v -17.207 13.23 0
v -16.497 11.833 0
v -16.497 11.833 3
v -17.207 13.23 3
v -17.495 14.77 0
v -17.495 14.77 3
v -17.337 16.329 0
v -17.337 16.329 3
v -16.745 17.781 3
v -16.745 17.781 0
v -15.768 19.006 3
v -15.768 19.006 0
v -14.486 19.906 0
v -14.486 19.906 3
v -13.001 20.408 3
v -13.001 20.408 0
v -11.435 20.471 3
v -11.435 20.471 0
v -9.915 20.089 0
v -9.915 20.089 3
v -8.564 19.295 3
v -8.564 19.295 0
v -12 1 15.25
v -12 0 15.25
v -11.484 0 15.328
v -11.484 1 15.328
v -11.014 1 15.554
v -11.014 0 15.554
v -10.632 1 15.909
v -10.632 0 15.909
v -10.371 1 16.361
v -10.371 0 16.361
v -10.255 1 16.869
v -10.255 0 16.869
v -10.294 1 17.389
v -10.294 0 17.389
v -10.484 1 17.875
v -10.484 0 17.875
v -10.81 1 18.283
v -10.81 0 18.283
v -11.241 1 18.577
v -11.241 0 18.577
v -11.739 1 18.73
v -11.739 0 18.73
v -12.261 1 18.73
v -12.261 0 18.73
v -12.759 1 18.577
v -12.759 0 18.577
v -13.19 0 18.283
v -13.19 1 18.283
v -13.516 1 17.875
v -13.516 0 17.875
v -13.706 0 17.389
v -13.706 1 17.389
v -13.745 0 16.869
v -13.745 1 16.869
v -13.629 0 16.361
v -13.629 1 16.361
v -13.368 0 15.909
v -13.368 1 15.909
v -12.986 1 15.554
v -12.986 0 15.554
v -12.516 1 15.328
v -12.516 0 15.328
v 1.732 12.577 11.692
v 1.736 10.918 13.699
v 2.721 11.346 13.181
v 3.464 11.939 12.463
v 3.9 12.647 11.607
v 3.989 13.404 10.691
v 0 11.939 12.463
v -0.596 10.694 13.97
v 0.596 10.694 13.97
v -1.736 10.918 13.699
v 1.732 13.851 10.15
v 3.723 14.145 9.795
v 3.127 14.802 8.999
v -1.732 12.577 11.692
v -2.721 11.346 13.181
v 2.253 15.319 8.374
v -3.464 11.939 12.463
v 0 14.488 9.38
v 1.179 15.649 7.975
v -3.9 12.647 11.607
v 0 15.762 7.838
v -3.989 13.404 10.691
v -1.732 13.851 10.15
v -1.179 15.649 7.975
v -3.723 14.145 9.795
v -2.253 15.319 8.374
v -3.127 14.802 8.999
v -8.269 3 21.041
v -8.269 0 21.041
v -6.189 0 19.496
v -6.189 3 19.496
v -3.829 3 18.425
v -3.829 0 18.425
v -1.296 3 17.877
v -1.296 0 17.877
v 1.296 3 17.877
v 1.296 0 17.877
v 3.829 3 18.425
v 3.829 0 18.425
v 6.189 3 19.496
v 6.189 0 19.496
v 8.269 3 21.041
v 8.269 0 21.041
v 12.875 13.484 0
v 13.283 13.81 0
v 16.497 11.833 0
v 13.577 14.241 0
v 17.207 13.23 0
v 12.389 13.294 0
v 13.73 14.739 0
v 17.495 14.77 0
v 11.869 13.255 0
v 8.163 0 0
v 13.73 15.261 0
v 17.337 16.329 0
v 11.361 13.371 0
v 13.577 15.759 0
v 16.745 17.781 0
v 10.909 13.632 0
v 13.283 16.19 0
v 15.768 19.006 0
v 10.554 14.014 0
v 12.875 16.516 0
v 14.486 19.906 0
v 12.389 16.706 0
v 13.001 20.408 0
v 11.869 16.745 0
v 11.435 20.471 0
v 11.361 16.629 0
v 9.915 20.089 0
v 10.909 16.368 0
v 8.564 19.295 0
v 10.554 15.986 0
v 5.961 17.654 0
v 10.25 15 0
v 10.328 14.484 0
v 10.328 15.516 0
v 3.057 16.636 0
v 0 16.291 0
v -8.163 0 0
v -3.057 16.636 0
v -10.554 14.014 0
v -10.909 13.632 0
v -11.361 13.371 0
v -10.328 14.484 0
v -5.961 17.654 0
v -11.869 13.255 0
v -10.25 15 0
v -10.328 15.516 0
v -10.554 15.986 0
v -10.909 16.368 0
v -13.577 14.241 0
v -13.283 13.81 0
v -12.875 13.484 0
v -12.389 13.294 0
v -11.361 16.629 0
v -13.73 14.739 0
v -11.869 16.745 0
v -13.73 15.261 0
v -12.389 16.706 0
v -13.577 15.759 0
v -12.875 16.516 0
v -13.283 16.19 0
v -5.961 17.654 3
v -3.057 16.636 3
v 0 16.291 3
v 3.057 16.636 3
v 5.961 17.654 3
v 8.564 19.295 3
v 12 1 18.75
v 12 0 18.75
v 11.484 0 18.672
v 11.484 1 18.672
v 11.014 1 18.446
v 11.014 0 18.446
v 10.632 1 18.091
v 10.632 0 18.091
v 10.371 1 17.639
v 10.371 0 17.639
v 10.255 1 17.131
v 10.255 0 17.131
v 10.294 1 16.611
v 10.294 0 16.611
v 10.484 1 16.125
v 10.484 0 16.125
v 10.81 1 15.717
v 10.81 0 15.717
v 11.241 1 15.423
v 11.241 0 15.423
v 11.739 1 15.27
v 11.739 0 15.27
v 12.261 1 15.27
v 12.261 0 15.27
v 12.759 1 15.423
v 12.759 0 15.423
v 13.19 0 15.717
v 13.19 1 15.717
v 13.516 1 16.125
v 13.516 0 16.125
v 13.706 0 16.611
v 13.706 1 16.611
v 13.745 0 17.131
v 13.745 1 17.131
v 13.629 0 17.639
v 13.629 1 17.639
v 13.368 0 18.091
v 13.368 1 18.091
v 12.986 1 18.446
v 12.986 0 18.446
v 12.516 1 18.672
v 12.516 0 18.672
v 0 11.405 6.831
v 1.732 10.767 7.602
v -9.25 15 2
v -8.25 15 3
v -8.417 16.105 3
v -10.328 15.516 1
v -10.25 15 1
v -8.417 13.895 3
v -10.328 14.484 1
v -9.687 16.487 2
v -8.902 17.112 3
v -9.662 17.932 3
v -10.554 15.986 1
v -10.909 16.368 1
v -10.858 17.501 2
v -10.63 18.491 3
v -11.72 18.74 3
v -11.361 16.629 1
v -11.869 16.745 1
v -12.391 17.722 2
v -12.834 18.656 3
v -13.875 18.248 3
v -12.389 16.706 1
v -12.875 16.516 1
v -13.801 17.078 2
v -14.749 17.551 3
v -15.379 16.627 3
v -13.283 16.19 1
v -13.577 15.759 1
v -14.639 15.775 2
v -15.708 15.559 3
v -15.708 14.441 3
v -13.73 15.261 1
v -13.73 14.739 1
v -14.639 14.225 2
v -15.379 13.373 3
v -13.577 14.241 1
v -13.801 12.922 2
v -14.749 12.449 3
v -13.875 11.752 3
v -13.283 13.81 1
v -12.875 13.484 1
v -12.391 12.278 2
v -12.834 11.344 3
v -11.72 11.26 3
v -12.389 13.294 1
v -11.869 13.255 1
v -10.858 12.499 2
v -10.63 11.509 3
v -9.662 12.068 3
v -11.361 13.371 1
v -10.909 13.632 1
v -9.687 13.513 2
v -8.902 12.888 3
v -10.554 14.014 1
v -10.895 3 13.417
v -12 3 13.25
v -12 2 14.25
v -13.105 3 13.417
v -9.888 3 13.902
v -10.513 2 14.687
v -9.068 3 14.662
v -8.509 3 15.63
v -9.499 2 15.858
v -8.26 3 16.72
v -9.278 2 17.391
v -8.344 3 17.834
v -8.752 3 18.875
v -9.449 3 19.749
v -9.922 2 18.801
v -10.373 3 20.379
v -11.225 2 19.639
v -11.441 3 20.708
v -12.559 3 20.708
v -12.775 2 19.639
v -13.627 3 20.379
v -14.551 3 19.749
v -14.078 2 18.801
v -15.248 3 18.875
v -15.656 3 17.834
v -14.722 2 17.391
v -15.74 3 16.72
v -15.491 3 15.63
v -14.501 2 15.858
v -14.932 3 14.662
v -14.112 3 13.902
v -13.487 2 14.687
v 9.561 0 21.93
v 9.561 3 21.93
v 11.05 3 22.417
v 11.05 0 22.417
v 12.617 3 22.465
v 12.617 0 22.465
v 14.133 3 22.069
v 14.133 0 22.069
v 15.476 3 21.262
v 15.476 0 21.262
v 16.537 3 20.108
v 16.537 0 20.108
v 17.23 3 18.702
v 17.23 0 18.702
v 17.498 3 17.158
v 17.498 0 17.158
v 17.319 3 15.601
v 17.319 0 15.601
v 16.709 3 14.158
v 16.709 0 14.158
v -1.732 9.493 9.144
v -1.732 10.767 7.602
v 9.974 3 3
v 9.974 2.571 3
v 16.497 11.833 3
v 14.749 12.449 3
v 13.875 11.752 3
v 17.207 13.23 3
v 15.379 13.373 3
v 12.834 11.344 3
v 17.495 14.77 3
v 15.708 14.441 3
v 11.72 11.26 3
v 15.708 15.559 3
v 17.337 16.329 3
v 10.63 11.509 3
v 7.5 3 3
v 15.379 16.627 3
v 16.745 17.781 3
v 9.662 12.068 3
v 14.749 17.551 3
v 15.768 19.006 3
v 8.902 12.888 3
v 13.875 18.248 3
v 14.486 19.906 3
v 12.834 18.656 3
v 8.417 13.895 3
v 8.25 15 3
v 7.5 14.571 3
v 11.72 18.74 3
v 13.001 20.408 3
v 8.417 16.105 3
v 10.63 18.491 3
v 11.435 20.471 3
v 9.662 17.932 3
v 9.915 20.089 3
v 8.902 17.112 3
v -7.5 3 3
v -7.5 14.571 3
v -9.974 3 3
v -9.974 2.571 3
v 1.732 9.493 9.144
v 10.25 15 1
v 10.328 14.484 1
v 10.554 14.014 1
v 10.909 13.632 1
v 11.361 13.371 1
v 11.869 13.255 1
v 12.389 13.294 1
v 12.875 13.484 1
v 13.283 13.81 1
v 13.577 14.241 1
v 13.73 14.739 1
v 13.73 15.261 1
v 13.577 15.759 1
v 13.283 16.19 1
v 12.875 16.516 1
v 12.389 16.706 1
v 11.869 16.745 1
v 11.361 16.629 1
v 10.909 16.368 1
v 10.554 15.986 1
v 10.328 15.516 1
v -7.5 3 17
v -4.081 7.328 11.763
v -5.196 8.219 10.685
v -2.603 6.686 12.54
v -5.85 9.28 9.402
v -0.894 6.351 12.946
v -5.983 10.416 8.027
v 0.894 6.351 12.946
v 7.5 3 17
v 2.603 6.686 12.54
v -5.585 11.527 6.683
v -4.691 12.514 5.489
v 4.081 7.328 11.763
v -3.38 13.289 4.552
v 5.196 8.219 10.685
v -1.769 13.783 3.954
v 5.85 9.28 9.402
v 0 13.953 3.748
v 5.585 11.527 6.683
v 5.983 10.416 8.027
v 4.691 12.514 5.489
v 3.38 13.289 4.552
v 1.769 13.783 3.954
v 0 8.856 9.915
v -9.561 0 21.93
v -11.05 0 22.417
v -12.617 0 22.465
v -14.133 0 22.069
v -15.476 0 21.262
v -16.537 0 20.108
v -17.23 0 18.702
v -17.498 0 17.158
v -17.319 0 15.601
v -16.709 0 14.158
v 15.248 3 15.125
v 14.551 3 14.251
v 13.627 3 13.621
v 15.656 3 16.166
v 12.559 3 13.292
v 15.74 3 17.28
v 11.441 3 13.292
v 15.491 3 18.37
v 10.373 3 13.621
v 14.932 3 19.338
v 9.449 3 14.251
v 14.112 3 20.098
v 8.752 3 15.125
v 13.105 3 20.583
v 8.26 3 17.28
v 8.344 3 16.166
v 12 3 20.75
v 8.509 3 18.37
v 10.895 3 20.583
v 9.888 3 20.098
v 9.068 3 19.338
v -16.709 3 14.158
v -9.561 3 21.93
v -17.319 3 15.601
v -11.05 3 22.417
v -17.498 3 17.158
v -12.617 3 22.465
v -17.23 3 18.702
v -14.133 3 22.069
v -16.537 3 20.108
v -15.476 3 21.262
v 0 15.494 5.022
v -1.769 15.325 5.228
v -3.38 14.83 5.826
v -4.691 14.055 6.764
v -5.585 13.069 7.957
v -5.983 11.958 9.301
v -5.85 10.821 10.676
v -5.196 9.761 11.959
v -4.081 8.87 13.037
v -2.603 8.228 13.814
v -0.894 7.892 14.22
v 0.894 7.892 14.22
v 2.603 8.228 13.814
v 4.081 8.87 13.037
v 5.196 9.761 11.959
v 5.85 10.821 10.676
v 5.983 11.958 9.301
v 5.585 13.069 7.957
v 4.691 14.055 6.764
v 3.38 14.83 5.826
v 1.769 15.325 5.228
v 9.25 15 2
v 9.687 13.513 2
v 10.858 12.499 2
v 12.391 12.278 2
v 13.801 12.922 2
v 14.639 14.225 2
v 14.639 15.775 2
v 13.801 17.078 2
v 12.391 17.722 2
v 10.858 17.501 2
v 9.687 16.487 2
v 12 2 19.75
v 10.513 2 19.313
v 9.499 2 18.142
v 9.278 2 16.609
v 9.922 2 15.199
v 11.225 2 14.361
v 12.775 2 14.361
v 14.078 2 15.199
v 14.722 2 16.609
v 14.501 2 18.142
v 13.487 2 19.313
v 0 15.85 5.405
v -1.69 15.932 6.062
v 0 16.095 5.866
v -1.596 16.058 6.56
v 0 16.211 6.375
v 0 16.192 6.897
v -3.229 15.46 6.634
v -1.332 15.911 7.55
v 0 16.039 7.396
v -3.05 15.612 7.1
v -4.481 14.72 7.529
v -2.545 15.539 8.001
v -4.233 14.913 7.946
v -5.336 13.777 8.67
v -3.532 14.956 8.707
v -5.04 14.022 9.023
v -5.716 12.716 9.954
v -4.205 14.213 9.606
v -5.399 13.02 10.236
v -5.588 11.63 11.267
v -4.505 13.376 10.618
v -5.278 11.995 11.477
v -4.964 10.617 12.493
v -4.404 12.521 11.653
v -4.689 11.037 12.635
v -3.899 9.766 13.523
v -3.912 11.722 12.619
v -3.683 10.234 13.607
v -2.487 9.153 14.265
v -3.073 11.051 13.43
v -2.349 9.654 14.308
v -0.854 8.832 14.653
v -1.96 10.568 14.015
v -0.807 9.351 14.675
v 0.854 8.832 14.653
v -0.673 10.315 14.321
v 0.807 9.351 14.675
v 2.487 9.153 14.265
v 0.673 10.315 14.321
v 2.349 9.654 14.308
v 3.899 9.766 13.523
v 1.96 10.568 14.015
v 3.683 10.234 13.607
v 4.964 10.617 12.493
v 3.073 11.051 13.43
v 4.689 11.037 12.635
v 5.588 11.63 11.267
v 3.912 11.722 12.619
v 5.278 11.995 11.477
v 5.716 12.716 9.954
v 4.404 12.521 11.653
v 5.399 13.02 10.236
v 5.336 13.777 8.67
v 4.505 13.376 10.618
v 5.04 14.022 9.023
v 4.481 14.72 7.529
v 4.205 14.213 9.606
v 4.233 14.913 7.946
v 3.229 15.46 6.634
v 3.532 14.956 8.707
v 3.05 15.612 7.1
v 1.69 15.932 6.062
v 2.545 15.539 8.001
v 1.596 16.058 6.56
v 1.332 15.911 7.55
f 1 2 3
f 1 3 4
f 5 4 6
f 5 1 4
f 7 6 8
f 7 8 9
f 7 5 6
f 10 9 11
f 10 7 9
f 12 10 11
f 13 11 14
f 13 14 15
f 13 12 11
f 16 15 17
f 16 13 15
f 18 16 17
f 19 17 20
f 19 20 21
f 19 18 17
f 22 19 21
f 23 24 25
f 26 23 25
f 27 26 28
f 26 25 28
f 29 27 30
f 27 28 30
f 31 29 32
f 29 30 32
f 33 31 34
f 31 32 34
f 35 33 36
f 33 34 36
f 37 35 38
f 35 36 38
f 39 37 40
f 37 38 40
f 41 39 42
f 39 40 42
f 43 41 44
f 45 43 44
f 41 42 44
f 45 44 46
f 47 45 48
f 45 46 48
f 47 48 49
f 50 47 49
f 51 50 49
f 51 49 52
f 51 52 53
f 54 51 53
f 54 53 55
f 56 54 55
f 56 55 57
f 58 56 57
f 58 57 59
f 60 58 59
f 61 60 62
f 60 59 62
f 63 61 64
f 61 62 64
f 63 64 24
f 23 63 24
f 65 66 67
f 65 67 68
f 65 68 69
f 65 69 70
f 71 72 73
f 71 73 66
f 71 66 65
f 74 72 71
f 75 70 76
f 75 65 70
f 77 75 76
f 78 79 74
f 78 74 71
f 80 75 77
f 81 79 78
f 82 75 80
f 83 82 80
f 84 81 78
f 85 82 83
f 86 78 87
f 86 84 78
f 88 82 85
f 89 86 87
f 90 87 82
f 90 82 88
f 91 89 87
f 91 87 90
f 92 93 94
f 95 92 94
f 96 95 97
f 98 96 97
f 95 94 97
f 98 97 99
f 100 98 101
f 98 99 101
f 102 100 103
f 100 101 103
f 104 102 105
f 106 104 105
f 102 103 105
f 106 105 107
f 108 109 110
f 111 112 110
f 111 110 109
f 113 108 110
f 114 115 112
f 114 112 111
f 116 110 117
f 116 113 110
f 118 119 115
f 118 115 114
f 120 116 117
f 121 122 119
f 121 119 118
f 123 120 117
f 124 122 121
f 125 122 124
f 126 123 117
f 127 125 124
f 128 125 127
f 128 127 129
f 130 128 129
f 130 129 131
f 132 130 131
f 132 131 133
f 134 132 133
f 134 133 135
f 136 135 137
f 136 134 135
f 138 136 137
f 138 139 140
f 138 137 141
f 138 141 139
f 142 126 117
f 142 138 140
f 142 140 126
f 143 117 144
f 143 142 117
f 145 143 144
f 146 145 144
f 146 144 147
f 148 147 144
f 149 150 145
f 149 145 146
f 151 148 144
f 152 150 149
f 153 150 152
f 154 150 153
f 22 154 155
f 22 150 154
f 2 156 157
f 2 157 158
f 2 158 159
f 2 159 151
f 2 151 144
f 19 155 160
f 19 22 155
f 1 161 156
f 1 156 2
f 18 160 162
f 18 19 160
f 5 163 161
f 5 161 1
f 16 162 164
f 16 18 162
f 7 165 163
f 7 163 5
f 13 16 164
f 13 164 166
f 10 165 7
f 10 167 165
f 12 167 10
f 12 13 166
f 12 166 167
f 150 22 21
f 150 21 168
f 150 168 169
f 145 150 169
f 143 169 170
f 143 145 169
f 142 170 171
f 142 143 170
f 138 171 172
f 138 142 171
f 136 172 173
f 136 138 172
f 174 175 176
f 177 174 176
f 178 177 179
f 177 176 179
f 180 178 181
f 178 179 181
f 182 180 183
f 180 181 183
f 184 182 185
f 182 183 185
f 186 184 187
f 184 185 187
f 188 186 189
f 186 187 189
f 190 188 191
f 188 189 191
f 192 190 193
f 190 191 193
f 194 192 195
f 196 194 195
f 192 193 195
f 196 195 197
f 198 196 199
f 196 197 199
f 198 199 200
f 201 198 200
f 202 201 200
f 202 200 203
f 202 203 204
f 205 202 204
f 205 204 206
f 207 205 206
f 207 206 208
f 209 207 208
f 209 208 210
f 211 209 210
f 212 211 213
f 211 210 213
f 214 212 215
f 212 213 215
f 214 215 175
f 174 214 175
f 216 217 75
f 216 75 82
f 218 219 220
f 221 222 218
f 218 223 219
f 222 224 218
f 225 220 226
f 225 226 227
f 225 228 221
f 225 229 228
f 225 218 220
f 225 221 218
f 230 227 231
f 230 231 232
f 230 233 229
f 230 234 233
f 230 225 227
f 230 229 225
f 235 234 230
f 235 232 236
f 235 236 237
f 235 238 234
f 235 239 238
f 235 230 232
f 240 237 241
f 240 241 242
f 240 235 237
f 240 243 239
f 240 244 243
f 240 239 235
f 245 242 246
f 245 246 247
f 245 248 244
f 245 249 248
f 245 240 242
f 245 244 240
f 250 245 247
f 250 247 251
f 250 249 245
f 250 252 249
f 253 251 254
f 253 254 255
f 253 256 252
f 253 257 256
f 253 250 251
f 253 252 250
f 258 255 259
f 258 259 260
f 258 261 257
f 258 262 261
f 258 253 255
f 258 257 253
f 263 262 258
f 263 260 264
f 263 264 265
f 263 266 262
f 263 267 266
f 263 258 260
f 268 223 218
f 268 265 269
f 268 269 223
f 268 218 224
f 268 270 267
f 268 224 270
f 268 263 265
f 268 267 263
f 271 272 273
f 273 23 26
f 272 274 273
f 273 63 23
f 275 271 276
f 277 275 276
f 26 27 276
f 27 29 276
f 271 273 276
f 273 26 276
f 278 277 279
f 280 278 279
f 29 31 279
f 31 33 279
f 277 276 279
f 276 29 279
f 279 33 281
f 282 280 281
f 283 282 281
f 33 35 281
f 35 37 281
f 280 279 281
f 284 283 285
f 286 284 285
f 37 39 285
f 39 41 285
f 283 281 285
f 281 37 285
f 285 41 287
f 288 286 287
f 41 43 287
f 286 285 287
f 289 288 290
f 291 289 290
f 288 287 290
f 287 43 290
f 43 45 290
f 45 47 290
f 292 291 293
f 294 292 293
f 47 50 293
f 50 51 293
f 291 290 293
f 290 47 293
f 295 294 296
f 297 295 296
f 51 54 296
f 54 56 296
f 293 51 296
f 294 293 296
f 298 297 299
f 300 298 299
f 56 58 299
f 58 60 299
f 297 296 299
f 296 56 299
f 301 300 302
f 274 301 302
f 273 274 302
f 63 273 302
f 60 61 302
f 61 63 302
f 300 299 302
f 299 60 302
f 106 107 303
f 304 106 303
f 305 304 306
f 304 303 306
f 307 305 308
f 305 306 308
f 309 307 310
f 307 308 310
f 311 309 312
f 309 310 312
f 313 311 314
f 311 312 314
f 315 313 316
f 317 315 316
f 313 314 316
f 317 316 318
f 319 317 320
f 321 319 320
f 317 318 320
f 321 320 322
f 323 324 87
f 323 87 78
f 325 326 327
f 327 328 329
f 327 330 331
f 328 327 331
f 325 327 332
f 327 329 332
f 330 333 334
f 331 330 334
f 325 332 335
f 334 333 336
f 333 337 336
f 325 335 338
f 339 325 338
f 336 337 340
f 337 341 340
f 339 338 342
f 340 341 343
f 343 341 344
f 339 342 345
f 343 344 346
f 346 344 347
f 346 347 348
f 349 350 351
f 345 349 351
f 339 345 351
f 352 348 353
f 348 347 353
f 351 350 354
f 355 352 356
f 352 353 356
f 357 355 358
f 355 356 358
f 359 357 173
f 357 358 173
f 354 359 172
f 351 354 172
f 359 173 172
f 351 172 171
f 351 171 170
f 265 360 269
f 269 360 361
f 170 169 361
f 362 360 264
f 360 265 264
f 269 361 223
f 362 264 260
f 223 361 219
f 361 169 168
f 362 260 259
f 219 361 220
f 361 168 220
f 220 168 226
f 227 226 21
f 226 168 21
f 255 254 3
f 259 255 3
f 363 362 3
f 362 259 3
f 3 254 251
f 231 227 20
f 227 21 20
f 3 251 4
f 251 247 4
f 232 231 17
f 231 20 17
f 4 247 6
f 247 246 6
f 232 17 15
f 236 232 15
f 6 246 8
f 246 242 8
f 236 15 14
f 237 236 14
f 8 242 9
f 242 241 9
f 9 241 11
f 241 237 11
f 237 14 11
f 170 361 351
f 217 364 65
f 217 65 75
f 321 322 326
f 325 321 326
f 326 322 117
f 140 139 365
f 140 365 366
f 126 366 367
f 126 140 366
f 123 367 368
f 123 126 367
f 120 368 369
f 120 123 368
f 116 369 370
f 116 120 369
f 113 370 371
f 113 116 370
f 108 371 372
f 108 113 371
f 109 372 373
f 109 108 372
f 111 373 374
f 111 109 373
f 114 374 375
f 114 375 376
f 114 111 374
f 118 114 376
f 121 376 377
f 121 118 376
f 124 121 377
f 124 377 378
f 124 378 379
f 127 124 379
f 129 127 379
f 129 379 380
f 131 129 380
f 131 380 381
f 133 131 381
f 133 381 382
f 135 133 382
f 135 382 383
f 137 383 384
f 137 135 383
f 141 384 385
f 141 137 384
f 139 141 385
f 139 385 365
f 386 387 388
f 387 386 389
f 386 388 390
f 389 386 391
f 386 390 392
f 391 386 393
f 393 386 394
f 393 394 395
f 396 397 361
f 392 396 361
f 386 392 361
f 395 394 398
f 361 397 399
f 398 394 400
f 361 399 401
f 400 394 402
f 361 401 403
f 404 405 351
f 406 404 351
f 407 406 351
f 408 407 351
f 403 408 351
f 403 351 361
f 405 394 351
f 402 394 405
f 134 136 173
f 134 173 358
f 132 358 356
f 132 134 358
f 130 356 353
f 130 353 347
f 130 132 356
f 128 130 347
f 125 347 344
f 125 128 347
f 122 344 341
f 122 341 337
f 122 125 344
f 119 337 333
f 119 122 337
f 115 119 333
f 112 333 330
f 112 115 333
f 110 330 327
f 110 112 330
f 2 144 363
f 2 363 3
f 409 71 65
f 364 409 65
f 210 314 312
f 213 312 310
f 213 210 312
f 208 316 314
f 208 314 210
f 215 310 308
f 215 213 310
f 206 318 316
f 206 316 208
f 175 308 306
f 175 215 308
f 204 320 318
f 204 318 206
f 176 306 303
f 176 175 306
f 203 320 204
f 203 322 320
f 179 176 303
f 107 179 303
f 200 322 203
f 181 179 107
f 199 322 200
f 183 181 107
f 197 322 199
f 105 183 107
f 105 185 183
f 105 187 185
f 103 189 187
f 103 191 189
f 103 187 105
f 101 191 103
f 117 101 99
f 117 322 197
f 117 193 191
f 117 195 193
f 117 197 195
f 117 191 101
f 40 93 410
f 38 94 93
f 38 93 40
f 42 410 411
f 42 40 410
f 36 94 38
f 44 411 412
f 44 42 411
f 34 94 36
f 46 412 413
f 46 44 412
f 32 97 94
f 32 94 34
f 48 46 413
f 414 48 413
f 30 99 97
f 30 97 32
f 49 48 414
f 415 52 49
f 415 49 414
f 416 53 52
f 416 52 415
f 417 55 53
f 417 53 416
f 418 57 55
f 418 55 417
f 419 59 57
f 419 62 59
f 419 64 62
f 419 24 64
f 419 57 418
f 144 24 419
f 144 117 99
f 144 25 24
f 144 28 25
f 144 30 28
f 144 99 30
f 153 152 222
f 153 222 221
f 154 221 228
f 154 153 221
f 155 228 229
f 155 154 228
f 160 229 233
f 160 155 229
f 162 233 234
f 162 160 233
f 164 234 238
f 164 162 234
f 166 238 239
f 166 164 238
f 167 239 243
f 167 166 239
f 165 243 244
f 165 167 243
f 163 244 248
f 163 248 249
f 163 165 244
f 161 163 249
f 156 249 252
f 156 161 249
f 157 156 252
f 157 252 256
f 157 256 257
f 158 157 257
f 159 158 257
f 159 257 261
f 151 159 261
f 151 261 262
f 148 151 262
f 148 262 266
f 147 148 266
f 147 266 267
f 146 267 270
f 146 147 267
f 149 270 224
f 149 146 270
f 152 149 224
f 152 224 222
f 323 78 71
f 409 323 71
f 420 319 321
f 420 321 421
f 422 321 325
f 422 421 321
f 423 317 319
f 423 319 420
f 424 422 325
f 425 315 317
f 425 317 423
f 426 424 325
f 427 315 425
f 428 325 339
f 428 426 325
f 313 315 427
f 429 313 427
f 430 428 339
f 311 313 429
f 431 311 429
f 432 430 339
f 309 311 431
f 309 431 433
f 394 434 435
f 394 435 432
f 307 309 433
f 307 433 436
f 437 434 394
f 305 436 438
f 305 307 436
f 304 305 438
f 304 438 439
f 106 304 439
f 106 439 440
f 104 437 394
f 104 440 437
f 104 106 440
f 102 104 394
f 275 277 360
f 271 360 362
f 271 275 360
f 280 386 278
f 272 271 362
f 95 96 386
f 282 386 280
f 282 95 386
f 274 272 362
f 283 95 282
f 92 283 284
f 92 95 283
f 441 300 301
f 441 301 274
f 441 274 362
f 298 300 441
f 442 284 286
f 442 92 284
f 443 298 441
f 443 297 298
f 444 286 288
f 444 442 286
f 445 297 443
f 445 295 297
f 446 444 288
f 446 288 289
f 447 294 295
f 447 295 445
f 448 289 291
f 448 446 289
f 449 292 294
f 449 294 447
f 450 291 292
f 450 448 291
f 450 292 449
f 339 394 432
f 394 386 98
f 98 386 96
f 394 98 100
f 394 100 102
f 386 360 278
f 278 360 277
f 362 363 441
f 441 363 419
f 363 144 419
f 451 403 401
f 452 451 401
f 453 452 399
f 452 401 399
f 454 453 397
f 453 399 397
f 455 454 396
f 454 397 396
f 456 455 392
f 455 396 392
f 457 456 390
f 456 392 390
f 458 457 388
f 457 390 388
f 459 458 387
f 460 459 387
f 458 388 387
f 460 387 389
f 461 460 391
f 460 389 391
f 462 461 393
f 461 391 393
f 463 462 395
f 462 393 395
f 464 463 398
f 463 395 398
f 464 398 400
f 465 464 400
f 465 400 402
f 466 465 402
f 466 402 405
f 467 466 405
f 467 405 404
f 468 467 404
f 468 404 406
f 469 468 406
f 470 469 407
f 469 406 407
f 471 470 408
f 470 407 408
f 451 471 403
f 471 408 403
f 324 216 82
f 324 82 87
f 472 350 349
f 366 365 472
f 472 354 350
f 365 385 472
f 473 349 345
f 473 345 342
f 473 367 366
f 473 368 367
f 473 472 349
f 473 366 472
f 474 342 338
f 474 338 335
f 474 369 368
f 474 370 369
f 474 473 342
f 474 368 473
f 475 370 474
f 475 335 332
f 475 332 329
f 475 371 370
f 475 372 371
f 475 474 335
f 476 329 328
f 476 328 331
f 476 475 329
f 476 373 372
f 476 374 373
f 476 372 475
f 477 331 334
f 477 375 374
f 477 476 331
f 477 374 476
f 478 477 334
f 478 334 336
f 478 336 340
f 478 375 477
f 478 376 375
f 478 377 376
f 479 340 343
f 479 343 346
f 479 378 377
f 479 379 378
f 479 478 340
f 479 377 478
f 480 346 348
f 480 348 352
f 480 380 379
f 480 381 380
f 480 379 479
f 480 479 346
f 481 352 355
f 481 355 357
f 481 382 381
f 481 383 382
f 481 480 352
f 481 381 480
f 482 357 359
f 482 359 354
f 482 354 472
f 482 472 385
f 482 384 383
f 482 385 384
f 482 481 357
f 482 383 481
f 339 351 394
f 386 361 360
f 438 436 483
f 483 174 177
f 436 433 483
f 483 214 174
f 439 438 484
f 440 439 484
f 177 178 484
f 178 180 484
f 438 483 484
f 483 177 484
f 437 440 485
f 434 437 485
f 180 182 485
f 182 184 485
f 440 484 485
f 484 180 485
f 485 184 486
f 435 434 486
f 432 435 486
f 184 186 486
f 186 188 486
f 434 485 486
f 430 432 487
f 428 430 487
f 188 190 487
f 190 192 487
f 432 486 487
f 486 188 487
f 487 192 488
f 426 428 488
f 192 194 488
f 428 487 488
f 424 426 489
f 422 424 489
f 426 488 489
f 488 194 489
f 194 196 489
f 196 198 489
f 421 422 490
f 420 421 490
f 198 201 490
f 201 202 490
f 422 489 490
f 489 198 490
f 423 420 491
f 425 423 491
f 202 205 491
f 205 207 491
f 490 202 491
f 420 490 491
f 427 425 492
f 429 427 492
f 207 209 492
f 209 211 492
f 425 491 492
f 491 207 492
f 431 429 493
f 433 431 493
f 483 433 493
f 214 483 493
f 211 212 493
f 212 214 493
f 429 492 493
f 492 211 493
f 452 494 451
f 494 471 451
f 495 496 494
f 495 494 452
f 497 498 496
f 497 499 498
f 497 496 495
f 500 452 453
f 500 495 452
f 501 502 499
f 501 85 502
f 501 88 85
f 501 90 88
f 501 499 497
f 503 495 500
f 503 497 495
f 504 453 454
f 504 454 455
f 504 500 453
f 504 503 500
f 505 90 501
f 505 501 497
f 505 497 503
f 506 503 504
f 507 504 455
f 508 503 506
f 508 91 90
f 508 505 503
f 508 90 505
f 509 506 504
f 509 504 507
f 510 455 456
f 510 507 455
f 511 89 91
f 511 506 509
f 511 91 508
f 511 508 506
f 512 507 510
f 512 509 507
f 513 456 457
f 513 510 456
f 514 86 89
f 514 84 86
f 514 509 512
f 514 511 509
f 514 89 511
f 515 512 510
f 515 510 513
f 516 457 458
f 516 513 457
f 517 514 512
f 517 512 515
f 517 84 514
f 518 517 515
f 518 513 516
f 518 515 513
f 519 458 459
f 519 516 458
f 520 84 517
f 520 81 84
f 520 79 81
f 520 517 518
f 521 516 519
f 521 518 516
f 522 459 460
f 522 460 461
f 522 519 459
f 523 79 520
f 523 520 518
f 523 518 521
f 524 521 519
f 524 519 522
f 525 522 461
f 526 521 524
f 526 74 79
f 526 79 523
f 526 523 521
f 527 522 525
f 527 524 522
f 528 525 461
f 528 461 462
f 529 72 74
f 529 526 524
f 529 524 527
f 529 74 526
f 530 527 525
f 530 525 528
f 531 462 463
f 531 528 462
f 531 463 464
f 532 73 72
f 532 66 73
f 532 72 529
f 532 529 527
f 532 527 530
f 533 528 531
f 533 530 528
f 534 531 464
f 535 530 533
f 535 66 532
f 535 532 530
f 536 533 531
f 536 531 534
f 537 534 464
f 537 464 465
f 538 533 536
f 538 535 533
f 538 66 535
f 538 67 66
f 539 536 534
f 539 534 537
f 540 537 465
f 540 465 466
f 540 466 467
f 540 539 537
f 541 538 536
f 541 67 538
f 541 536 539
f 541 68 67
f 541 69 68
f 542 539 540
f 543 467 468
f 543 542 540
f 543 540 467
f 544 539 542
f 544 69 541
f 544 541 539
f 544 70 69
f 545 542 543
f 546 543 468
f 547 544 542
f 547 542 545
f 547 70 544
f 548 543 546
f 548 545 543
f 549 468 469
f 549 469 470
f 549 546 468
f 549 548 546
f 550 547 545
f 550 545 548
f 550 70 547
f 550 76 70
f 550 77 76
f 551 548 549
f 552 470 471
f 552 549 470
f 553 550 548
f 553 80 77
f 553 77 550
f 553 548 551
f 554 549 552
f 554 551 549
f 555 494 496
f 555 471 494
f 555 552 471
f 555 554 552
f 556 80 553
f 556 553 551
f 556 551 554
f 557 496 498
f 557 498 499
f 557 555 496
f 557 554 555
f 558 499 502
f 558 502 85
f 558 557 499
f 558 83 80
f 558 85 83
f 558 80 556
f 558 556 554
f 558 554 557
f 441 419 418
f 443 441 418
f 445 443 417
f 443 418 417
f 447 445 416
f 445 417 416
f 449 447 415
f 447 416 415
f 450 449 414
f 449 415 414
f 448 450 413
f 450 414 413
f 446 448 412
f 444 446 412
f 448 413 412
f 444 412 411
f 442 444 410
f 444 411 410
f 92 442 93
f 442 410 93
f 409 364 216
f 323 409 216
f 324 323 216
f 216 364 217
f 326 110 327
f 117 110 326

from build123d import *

# Parameters (mm, degrees)
SKETCH_1_R      = 1.75
EXTRUDE_1_DEPTH = 3
SKETCH_2_R      = 1.75
EXTRUDE_2_DEPTH = 3
EXTRUDE_3_DEPTH = 7.5
SKETCH_4_R      = 6
EXTRUDE_4_DEPTH = 4
FILLET_1_R      = 2
CHAMFER_1_SIZE  = 2


with BuildPart() as part:
    # 草图1 → 凸台-拉伸1 (new body)
    with BuildSketch(Plane.XY):
        with BuildLine():
            Line((8.162825685, 0), (-8.162825685, 0))
            Line((-8.162825685, 0), (-16.496696216, 11.833026185))
            ThreePointArc((-16.496696216, 11.833026185), (-15.768394863, 19.006145299), (-8.564177238, 19.294778452))
            ThreePointArc((-8.564177238, 19.294778452), (0, 16.290627288), (8.564177238, 19.294778452))
            ThreePointArc((8.564177238, 19.294778452), (15.768394863, 19.006145299), (16.496696216, 11.833026185))
            Line((16.496696216, 11.833026185), (8.162825685, 0))
        make_face()
        with Locations((-12, 15)):
            Circle(SKETCH_1_R, mode=Mode.SUBTRACT)
        with Locations(Location((12, 15, 0), (0, 0, 180))):
            Circle(SKETCH_1_R, mode=Mode.SUBTRACT)
    extrude(amount=EXTRUDE_1_DEPTH)

    # 草图2 → 凸台-拉伸2 (add)
    with BuildSketch(Plane.XZ):
        with BuildLine():
            Line((8.162825685, 0), (-8.162825685, 0))
            Line((-8.162825685, 0), (-16.708682104, 14.157762704))
            ThreePointArc((-16.708682104, 14.157762704), (-15.476402024, 21.261998237), (-8.269459435, 21.041418945))
            ThreePointArc((-8.269459435, 21.041418945), (0, 17.808193987), (8.269459435, 21.041418945))
            ThreePointArc((8.269459435, 21.041418945), (15.476402024, 21.261998237), (16.708682104, 14.157762704))
            Line((16.708682104, 14.157762704), (8.162825685, 0))
        make_face()
        with Locations(Location((-12, 17, 0), (0, 0, 270))):
            Circle(SKETCH_2_R, mode=Mode.SUBTRACT)
        with Locations(Location((12, 17, 0), (0, 0, 90))):
            Circle(SKETCH_2_R, mode=Mode.SUBTRACT)
    extrude(amount=-EXTRUDE_2_DEPTH)

    # 草图3 → 凸台-拉伸3 (add, symmetric)
    with BuildSketch(Plane(origin=(0, 0, 0), x_dir=(0, 0, -1), z_dir=(1, 0, 0))):
        Polygon((-3, 3), (-17, 3), (-3, 14.571172971), align=None)
    extrude(amount=EXTRUDE_3_DEPTH, both=True)

    # 草图4 → 凸台-拉伸4 (add)
    with BuildSketch(Plane(origin=(0, 10.130402441, 8.372902779), x_dir=(1, 0, 0), z_dir=(0, 0.7708007256408878, 0.6370763230190564))):
        with Locations(Location((0, 0, 0), (0, 0, 90))):
            Circle(SKETCH_4_R)
        Polygon((0, 2), (-1.732050808, 1), (-1.732050808, -1), (0, -2), (1.732050808, -1), (1.732050808, 1), align=None, mode=Mode.SUBTRACT)
    extrude(amount=EXTRUDE_4_DEPTH)

    # 圆角1
    fillet_1_edges = [part.edges().sort_by_distance(p)[0] for p in [
        (0, 9.391147406, 15.546012425),
    ]]
    fillet(fillet_1_edges, radius=FILLET_1_R)

    # 倒角1
    chamfer_1_edges = [part.edges().sort_by_distance(p)[0] for p in [
        (-13.75, 15, 3),
        (13.75, 15, 3),
        (12, 3, 15.25),
        (-12, 3, 18.75),
    ]]
    chamfer(chamfer_1_edges, length=CHAMFER_1_SIZE)


solid = part.part
